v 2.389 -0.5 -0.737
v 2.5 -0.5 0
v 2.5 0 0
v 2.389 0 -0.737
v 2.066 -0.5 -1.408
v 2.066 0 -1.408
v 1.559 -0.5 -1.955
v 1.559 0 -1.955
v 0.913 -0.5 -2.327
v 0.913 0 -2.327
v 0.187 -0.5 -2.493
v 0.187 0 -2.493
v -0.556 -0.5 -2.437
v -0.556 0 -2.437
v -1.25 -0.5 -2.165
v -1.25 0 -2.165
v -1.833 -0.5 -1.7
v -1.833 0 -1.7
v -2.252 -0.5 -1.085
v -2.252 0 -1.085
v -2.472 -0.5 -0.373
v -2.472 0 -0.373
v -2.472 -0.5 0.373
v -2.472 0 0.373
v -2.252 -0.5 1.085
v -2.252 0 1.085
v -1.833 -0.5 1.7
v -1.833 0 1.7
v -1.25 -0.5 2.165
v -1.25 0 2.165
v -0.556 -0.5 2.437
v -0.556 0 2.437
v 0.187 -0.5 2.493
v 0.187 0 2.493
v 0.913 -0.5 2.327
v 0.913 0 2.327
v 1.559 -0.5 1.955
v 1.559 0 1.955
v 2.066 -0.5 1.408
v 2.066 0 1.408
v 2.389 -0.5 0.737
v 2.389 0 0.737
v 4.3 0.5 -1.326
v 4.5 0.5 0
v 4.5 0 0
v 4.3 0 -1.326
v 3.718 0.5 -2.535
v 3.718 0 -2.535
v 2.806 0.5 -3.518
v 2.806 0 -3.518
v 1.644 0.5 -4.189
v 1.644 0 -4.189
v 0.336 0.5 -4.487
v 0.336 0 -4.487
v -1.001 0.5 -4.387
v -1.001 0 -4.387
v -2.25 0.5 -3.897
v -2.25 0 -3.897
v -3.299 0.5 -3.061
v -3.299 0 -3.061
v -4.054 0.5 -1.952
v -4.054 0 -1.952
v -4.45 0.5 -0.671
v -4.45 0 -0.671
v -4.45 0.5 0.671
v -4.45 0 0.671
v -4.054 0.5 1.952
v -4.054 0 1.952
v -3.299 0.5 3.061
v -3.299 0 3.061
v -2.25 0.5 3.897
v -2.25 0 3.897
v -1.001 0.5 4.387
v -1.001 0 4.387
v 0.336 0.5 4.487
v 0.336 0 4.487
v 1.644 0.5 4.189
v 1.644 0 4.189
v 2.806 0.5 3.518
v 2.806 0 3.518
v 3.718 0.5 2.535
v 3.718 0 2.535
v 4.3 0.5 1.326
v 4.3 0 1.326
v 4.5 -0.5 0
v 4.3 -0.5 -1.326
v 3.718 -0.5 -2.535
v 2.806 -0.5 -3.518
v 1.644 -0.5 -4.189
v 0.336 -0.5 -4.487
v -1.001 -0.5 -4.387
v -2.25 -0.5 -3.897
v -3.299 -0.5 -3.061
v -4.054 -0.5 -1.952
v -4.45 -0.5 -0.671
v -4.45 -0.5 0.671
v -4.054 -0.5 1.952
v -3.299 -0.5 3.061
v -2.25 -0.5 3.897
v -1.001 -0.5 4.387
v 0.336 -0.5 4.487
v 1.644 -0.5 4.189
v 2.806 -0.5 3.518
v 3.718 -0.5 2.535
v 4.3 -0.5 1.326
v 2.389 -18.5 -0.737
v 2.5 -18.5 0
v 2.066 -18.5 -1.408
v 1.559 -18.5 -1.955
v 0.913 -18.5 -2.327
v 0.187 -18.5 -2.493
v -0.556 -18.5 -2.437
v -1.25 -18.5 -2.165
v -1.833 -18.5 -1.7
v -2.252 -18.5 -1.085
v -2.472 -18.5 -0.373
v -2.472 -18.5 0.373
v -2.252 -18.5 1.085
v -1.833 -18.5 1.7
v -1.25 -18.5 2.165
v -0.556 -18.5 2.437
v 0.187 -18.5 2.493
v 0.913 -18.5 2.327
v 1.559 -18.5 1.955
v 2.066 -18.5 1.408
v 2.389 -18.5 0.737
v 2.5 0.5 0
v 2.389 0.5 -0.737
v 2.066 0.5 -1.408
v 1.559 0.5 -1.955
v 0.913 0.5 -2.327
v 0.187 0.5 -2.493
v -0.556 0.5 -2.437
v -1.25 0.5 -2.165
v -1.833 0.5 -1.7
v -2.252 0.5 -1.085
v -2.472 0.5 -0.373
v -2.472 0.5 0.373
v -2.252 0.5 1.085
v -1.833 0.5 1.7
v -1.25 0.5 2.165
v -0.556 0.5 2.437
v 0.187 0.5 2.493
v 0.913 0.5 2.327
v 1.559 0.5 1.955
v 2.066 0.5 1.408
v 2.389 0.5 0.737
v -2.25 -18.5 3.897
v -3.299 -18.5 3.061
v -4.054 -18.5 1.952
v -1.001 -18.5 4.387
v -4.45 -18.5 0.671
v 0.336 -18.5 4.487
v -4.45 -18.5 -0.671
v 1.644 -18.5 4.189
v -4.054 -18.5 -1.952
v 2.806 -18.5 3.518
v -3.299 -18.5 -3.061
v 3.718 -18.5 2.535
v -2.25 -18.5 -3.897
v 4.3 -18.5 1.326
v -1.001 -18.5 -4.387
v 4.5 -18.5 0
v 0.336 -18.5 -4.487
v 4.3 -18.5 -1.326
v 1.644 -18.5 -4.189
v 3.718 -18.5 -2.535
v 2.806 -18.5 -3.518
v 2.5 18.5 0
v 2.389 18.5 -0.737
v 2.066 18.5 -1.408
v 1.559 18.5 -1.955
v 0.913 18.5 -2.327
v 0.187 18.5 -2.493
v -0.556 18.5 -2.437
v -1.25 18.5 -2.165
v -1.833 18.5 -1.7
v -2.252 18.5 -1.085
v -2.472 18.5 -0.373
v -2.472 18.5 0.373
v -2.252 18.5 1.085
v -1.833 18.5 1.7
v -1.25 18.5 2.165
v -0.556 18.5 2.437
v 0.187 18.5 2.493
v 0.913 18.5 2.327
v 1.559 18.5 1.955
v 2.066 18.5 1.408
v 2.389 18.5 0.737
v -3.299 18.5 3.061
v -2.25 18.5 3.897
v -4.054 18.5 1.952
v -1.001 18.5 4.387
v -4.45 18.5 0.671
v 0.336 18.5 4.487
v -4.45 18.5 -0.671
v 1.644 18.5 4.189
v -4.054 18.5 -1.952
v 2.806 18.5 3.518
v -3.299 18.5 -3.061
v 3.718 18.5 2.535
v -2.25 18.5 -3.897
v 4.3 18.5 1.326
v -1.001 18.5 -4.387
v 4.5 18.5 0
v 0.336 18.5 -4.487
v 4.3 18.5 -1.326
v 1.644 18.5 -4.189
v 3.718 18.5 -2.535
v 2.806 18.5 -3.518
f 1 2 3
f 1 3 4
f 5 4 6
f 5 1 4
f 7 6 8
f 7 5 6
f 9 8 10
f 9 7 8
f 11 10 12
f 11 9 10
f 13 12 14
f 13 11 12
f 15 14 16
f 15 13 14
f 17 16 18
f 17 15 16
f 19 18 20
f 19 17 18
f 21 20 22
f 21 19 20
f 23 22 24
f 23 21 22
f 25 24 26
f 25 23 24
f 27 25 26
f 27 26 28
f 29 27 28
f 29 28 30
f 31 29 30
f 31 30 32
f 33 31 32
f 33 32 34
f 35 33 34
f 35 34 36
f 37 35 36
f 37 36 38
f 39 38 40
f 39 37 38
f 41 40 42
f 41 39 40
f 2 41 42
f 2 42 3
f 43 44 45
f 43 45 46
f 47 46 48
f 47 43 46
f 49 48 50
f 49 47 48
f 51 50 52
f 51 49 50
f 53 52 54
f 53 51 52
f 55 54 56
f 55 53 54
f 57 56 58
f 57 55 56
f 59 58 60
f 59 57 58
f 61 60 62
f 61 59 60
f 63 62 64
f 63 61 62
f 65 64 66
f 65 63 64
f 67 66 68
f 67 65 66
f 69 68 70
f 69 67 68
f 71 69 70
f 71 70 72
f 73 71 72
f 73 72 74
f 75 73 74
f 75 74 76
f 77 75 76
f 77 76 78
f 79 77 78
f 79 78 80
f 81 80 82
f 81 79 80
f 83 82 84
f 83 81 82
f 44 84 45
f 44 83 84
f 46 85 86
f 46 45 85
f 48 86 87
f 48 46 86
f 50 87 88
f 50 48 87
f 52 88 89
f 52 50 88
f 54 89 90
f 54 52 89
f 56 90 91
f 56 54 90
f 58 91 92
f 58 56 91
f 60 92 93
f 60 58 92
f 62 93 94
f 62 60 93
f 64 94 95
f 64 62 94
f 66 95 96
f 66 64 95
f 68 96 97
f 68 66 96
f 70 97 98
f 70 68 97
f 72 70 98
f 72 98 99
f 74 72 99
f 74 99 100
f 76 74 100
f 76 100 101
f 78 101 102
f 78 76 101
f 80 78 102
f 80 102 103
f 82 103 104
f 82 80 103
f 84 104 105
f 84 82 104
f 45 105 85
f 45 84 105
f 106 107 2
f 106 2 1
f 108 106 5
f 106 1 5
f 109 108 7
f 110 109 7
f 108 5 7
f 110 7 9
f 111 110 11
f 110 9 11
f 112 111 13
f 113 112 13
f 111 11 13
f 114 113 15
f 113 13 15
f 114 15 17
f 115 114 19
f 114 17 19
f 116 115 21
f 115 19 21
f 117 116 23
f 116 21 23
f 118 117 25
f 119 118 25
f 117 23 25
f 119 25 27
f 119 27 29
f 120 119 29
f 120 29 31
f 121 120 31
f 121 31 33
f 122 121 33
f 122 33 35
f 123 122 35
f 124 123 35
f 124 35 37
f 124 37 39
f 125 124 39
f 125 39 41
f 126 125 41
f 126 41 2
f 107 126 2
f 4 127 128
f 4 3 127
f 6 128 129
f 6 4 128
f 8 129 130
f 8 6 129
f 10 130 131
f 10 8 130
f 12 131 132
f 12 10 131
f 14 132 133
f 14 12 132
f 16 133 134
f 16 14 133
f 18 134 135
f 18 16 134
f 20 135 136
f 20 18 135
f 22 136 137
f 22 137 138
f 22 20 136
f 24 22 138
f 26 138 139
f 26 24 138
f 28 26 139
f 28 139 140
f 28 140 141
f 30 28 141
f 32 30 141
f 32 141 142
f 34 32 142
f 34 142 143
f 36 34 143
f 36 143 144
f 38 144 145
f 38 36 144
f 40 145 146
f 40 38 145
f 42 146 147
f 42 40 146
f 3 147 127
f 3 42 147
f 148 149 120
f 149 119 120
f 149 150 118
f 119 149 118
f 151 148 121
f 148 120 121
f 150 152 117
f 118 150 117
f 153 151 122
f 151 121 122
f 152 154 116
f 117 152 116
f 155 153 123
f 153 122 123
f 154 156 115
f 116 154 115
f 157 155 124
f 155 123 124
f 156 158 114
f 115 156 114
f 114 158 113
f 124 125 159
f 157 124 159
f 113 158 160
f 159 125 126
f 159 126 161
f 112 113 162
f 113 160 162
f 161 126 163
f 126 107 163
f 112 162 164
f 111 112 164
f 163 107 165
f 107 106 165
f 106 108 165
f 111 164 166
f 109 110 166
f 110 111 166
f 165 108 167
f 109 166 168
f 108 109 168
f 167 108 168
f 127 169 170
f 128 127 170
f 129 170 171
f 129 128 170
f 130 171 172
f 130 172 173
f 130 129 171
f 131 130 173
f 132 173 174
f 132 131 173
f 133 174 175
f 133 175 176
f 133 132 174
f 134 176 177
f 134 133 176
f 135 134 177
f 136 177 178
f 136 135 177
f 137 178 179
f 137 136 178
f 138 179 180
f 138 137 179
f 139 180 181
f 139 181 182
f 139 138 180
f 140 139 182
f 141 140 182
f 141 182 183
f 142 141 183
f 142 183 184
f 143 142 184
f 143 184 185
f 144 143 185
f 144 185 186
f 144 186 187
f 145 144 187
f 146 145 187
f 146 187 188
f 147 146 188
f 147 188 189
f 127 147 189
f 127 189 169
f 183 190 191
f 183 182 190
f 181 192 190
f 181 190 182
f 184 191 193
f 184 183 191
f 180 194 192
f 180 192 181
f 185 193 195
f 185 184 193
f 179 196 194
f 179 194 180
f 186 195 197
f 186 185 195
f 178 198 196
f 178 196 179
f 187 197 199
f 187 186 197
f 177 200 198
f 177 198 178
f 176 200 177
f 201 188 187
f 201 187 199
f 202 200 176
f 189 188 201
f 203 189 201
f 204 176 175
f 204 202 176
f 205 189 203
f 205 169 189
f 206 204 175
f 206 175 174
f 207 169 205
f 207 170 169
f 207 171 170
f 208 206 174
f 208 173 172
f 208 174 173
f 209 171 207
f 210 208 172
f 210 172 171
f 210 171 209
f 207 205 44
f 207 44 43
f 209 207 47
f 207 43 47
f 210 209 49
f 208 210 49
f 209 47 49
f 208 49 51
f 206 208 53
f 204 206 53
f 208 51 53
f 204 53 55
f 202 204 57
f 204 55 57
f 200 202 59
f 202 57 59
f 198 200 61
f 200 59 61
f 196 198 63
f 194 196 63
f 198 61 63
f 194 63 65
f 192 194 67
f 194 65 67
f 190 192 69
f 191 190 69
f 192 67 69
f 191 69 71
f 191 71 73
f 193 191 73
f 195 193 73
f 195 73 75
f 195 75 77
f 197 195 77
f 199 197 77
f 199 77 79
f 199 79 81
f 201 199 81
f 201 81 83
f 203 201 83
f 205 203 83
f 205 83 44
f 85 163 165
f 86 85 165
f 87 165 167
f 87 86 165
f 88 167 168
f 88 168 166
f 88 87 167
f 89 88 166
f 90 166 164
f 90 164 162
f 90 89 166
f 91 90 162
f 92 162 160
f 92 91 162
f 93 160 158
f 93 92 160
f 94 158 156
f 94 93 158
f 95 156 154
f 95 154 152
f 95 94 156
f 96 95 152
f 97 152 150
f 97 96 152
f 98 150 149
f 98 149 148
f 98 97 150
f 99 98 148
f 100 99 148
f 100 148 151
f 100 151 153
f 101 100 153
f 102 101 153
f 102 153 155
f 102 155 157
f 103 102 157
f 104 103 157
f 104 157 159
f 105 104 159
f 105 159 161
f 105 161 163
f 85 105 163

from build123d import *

# Parameters (mm, degrees)
SKETCH1_R                = 4.5
SKETCH1_R_2              = 2.5
BOSS_EXTRUDE1_DEPTH      = 0.5
SKETCH1_2_R              = 4.5
SKETCH1_2_R_2            = 2.5
BOSS_EXTRUDE2_DEPTH      = 18.5
BOSS_EXTRUDE2_DEPTH_BACK = 18.5


with BuildPart() as part:
    # Sketch1 → Boss-Extrude1 (new body, symmetric)
    with BuildSketch(Plane(origin=(0, 0, 0), x_dir=(1, 0, 0), z_dir=(0, 1, 0))):
        Circle(SKETCH1_R)
        Circle(SKETCH1_R_2, mode=Mode.SUBTRACT)
    extrude(amount=BOSS_EXTRUDE1_DEPTH, both=True)

    # Sketch1_2 → Boss-Extrude2 (add, two sides)
    with BuildSketch(Plane(origin=(0, 0, 0), x_dir=(1, 0, 0), z_dir=(0, 1, 0))) as boss_extrude2_sk:
        Circle(SKETCH1_2_R)
        Circle(SKETCH1_2_R_2, mode=Mode.SUBTRACT)
    extrude(amount=BOSS_EXTRUDE2_DEPTH)
    extrude(boss_extrude2_sk.sketch, amount=-BOSS_EXTRUDE2_DEPTH_BACK)


solid = part.part
